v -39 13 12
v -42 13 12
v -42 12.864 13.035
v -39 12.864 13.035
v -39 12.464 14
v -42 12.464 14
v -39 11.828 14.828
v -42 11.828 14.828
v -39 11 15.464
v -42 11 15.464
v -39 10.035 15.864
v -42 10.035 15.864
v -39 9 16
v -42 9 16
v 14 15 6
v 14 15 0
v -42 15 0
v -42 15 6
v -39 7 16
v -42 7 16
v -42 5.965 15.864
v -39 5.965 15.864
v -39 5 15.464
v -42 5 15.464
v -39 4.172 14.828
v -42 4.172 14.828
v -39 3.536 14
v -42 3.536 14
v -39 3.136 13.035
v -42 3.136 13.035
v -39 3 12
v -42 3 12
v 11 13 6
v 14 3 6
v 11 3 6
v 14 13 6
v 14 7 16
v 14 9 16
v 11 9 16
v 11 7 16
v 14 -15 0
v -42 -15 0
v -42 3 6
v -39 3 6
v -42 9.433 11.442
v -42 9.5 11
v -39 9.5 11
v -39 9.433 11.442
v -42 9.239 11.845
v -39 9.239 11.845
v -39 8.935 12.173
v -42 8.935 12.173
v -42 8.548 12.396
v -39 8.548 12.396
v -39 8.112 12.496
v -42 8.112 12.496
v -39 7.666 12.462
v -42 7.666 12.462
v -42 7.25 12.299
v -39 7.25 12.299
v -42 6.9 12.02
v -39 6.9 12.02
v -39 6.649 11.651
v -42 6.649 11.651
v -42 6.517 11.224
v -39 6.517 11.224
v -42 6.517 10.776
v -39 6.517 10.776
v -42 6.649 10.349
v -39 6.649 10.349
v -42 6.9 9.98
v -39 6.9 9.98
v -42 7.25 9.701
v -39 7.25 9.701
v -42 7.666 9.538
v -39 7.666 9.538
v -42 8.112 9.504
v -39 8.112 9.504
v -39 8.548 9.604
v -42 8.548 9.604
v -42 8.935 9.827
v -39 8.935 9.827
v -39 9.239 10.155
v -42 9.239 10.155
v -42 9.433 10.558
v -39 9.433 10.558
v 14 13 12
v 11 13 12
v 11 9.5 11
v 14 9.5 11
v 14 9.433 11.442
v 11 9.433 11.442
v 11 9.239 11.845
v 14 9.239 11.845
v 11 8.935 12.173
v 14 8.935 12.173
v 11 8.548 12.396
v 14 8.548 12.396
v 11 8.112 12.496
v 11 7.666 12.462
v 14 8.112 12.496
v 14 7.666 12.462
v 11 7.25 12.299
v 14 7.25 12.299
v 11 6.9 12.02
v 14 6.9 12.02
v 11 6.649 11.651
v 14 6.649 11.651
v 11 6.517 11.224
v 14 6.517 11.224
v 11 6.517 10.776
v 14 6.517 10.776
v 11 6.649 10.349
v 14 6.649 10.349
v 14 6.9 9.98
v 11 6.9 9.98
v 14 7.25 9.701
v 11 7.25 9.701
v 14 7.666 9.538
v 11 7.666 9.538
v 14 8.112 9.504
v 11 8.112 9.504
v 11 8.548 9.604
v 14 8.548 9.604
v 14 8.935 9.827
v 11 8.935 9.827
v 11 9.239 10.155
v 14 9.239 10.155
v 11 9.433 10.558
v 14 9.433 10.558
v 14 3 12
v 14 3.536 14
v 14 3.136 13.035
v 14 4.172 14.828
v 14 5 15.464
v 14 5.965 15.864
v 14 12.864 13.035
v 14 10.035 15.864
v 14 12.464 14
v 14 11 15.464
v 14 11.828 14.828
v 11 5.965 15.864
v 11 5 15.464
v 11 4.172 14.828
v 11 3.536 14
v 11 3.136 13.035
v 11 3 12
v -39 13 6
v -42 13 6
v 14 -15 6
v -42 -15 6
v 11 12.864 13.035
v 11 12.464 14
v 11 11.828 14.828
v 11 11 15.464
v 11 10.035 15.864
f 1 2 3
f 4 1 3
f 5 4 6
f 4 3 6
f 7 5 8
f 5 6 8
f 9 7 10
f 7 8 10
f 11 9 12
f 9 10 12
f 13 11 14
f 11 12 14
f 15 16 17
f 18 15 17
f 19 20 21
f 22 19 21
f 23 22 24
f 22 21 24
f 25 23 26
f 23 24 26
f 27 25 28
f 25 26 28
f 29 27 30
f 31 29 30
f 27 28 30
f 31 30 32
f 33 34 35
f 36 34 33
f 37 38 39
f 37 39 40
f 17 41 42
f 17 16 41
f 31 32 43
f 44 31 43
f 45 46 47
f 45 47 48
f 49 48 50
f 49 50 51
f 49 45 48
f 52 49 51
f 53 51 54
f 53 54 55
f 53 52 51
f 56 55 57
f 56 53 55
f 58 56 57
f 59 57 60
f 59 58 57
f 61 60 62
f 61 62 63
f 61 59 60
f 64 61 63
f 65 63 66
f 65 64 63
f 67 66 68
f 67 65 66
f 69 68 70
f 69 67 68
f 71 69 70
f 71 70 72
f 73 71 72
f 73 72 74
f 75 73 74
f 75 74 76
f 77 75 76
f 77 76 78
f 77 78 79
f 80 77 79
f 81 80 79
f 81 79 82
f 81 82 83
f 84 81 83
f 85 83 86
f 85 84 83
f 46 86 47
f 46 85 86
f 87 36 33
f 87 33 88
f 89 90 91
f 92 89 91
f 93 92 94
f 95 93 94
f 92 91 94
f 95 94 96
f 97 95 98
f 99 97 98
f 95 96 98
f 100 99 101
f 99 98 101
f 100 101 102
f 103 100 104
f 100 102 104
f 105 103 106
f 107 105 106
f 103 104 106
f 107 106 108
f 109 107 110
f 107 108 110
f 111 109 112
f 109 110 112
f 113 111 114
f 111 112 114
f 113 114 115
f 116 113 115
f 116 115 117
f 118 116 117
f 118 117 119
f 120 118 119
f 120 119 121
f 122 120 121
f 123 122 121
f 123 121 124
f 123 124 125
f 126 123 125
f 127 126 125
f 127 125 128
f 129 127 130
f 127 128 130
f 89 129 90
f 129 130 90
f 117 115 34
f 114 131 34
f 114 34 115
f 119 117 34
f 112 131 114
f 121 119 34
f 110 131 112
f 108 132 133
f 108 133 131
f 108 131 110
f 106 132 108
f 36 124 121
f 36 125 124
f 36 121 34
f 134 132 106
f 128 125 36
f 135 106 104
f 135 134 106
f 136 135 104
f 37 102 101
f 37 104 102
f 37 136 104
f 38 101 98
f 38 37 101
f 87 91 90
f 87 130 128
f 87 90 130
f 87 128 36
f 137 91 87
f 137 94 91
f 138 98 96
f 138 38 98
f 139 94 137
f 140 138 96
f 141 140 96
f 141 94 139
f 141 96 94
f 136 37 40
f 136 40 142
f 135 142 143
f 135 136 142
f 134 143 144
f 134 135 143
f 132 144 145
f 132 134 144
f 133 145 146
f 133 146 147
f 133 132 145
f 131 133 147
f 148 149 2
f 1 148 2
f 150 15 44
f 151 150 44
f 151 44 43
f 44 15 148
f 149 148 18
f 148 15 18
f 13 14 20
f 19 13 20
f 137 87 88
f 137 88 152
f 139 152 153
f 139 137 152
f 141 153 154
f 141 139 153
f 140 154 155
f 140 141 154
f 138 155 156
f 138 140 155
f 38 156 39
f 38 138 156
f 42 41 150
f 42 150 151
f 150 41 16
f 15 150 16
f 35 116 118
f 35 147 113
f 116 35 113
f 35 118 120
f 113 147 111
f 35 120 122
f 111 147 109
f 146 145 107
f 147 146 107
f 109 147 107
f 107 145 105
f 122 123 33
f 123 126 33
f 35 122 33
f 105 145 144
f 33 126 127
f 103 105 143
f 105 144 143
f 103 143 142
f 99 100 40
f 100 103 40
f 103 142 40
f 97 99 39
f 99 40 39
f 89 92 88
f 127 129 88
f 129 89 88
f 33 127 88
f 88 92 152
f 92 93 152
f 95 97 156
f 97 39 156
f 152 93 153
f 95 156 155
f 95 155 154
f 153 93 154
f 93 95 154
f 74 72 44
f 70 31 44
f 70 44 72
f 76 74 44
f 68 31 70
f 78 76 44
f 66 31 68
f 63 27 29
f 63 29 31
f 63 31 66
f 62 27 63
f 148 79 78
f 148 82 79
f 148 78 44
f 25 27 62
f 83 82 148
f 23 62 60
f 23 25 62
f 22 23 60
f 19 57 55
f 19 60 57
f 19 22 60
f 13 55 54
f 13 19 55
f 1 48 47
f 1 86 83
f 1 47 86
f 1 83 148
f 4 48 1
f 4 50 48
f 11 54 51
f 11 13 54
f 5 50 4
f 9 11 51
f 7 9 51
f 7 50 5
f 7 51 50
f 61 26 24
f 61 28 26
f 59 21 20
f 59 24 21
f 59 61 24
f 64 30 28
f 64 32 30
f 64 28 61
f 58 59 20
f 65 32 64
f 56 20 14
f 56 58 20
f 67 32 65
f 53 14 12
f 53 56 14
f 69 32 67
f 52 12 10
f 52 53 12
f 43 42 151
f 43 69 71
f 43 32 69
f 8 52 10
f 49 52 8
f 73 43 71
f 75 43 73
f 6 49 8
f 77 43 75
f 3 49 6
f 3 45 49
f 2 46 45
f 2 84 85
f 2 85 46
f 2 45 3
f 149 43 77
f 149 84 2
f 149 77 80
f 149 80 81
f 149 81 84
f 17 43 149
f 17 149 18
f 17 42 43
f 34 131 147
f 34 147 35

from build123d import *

# Parameters (mm, degrees)
F0_W     = 28
F0_H     = 30
F1_DEPTH = 6
F2_R     = 1.5
F3_DEPTH = 3


with BuildPart() as f1:
    # F0 (on Top) → F1 (new body)
    with BuildSketch(Plane.XY):
        Rectangle(F0_W, F0_H)
    extrude(amount=F1_DEPTH)



with BuildPart() as f3:
    # F2 (on face) → F3 (new body)
    with BuildSketch(Plane.YZ.offset(14)):
        with BuildLine():
            Line((3, 6), (13, 6))
            Line((13, 6), (13, 12))
            ThreePointArc((13, 12), (11.8284271247, 14.8284271247), (9, 16))
            Line((9, 16), (7, 16))
            ThreePointArc((7, 16), (4.1715728753, 14.8284271247), (3, 12))
            Line((3, 12), (3, 6))
        make_face()
        with Locations((8, 11)):
            Circle(F2_R, mode=Mode.SUBTRACT)
    extrude(amount=-F3_DEPTH)


with BuildPart() as f1_1:
    add(f1.part)
    # F4: F3, F1 across face
    add(f3.part.mirror(Plane(origin=(-14, 0, 3), x_dir=(0, -1, 0), z_dir=(-1, 0, 0))))
    add(f1.part.mirror(Plane(origin=(-14, 0, 3), x_dir=(0, -1, 0), z_dir=(-1, 0, 0))))


solid = Compound([f3.part, f1_1.part])
